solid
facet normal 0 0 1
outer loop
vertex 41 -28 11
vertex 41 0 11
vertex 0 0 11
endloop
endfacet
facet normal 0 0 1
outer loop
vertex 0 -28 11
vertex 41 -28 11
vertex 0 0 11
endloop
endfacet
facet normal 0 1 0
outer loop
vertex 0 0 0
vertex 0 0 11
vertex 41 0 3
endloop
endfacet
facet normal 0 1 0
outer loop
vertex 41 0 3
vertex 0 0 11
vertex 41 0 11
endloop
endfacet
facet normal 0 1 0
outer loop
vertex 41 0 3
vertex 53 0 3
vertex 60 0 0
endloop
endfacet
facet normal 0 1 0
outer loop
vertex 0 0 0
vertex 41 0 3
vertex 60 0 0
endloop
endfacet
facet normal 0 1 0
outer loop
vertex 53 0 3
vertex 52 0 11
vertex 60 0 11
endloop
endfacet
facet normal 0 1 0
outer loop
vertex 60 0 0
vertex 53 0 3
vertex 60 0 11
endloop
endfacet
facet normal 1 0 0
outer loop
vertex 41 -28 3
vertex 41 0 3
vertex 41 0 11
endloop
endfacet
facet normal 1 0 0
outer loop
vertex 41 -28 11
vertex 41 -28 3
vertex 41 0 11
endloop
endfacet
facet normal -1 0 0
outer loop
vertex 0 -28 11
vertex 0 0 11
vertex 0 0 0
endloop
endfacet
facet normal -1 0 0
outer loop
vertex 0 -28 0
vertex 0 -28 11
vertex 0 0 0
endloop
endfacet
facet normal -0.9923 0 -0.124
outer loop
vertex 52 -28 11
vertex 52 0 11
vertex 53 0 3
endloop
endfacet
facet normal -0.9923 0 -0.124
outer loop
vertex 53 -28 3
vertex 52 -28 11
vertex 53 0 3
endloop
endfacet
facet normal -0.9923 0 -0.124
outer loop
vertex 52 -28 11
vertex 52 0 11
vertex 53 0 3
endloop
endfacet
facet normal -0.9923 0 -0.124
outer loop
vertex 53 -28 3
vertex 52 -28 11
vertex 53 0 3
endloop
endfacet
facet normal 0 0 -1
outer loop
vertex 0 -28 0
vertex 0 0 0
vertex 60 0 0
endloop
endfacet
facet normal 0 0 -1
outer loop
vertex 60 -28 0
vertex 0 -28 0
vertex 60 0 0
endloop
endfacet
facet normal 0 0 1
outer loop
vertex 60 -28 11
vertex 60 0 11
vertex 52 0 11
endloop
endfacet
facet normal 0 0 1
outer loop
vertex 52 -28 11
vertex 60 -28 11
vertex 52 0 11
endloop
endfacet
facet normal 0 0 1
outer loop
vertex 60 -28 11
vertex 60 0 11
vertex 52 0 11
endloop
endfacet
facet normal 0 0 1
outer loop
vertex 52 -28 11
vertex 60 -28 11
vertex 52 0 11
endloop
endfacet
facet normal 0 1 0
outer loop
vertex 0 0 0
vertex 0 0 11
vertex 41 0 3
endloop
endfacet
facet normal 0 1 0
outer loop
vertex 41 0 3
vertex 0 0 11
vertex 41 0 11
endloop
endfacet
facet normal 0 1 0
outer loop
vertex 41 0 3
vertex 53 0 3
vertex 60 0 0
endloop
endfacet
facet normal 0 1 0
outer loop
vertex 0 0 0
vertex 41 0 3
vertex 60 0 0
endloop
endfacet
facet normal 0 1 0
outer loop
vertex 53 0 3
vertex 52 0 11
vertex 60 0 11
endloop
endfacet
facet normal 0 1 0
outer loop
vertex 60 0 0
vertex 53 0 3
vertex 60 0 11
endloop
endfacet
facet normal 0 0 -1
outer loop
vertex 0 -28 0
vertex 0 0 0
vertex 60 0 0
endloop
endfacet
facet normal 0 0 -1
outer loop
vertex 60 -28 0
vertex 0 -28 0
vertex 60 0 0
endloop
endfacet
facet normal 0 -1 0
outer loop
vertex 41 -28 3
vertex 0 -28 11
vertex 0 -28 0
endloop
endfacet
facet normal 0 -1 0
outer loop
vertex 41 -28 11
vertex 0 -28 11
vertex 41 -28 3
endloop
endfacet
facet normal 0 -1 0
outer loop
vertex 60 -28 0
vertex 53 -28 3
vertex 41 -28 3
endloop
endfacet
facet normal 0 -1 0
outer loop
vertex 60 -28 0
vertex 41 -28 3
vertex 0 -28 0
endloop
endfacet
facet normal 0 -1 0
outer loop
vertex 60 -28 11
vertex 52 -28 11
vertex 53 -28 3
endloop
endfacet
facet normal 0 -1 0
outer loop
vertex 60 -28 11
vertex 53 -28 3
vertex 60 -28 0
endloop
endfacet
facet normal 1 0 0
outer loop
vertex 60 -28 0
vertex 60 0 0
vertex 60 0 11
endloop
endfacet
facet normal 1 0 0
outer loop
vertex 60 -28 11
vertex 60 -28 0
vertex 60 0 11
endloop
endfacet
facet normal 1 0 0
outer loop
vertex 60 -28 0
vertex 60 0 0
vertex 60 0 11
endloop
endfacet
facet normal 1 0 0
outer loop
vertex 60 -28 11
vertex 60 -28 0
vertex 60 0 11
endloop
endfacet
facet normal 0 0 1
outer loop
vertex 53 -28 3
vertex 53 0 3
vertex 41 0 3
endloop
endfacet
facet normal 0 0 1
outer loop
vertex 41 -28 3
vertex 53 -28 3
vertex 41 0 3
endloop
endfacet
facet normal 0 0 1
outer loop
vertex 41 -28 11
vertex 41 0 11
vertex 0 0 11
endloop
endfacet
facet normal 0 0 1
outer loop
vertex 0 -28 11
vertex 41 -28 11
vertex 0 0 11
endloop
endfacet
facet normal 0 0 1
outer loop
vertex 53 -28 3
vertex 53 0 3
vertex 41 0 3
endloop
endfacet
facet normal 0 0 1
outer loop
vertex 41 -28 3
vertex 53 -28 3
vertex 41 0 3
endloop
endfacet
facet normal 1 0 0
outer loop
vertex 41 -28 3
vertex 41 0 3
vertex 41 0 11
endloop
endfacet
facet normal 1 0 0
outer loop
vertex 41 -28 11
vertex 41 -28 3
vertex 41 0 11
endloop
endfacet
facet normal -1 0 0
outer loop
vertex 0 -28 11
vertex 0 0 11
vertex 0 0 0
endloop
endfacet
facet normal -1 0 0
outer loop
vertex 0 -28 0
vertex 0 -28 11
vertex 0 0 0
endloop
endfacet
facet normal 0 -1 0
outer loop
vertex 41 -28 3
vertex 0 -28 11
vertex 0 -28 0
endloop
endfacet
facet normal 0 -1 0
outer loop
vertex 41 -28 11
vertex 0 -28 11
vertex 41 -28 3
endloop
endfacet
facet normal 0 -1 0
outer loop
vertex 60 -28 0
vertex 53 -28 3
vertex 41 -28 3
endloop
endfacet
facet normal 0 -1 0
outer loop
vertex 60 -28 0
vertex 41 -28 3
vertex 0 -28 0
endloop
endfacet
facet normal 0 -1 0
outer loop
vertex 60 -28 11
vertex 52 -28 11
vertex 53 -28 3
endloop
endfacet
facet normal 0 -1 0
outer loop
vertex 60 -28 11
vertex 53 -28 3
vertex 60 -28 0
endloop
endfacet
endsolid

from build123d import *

# Parameters (mm, degrees)
EXTRUDE_DEPTH    = 28
EXTRUDE001_DEPTH = 28


with BuildPart() as extrude_body:
    # Sketch → Extrude (new body)
    with BuildSketch(Plane.XZ):
        Polygon((0, 0), (60, 0), (60, 11), (52, 11), (53, 3), (41, 3), (41, 11), (0, 11), align=None)
    extrude(amount=EXTRUDE_DEPTH)


with BuildPart() as extrude001:
    # Sketch → Extrude001 (new body)
    with BuildSketch(Plane.XZ):
        Polygon((0, 0), (60, 0), (60, 11), (52, 11), (53, 3), (41, 3), (41, 11), (0, 11), align=None)
    extrude(amount=EXTRUDE001_DEPTH)


solid = Compound([extrude_body.part, extrude001.part])
